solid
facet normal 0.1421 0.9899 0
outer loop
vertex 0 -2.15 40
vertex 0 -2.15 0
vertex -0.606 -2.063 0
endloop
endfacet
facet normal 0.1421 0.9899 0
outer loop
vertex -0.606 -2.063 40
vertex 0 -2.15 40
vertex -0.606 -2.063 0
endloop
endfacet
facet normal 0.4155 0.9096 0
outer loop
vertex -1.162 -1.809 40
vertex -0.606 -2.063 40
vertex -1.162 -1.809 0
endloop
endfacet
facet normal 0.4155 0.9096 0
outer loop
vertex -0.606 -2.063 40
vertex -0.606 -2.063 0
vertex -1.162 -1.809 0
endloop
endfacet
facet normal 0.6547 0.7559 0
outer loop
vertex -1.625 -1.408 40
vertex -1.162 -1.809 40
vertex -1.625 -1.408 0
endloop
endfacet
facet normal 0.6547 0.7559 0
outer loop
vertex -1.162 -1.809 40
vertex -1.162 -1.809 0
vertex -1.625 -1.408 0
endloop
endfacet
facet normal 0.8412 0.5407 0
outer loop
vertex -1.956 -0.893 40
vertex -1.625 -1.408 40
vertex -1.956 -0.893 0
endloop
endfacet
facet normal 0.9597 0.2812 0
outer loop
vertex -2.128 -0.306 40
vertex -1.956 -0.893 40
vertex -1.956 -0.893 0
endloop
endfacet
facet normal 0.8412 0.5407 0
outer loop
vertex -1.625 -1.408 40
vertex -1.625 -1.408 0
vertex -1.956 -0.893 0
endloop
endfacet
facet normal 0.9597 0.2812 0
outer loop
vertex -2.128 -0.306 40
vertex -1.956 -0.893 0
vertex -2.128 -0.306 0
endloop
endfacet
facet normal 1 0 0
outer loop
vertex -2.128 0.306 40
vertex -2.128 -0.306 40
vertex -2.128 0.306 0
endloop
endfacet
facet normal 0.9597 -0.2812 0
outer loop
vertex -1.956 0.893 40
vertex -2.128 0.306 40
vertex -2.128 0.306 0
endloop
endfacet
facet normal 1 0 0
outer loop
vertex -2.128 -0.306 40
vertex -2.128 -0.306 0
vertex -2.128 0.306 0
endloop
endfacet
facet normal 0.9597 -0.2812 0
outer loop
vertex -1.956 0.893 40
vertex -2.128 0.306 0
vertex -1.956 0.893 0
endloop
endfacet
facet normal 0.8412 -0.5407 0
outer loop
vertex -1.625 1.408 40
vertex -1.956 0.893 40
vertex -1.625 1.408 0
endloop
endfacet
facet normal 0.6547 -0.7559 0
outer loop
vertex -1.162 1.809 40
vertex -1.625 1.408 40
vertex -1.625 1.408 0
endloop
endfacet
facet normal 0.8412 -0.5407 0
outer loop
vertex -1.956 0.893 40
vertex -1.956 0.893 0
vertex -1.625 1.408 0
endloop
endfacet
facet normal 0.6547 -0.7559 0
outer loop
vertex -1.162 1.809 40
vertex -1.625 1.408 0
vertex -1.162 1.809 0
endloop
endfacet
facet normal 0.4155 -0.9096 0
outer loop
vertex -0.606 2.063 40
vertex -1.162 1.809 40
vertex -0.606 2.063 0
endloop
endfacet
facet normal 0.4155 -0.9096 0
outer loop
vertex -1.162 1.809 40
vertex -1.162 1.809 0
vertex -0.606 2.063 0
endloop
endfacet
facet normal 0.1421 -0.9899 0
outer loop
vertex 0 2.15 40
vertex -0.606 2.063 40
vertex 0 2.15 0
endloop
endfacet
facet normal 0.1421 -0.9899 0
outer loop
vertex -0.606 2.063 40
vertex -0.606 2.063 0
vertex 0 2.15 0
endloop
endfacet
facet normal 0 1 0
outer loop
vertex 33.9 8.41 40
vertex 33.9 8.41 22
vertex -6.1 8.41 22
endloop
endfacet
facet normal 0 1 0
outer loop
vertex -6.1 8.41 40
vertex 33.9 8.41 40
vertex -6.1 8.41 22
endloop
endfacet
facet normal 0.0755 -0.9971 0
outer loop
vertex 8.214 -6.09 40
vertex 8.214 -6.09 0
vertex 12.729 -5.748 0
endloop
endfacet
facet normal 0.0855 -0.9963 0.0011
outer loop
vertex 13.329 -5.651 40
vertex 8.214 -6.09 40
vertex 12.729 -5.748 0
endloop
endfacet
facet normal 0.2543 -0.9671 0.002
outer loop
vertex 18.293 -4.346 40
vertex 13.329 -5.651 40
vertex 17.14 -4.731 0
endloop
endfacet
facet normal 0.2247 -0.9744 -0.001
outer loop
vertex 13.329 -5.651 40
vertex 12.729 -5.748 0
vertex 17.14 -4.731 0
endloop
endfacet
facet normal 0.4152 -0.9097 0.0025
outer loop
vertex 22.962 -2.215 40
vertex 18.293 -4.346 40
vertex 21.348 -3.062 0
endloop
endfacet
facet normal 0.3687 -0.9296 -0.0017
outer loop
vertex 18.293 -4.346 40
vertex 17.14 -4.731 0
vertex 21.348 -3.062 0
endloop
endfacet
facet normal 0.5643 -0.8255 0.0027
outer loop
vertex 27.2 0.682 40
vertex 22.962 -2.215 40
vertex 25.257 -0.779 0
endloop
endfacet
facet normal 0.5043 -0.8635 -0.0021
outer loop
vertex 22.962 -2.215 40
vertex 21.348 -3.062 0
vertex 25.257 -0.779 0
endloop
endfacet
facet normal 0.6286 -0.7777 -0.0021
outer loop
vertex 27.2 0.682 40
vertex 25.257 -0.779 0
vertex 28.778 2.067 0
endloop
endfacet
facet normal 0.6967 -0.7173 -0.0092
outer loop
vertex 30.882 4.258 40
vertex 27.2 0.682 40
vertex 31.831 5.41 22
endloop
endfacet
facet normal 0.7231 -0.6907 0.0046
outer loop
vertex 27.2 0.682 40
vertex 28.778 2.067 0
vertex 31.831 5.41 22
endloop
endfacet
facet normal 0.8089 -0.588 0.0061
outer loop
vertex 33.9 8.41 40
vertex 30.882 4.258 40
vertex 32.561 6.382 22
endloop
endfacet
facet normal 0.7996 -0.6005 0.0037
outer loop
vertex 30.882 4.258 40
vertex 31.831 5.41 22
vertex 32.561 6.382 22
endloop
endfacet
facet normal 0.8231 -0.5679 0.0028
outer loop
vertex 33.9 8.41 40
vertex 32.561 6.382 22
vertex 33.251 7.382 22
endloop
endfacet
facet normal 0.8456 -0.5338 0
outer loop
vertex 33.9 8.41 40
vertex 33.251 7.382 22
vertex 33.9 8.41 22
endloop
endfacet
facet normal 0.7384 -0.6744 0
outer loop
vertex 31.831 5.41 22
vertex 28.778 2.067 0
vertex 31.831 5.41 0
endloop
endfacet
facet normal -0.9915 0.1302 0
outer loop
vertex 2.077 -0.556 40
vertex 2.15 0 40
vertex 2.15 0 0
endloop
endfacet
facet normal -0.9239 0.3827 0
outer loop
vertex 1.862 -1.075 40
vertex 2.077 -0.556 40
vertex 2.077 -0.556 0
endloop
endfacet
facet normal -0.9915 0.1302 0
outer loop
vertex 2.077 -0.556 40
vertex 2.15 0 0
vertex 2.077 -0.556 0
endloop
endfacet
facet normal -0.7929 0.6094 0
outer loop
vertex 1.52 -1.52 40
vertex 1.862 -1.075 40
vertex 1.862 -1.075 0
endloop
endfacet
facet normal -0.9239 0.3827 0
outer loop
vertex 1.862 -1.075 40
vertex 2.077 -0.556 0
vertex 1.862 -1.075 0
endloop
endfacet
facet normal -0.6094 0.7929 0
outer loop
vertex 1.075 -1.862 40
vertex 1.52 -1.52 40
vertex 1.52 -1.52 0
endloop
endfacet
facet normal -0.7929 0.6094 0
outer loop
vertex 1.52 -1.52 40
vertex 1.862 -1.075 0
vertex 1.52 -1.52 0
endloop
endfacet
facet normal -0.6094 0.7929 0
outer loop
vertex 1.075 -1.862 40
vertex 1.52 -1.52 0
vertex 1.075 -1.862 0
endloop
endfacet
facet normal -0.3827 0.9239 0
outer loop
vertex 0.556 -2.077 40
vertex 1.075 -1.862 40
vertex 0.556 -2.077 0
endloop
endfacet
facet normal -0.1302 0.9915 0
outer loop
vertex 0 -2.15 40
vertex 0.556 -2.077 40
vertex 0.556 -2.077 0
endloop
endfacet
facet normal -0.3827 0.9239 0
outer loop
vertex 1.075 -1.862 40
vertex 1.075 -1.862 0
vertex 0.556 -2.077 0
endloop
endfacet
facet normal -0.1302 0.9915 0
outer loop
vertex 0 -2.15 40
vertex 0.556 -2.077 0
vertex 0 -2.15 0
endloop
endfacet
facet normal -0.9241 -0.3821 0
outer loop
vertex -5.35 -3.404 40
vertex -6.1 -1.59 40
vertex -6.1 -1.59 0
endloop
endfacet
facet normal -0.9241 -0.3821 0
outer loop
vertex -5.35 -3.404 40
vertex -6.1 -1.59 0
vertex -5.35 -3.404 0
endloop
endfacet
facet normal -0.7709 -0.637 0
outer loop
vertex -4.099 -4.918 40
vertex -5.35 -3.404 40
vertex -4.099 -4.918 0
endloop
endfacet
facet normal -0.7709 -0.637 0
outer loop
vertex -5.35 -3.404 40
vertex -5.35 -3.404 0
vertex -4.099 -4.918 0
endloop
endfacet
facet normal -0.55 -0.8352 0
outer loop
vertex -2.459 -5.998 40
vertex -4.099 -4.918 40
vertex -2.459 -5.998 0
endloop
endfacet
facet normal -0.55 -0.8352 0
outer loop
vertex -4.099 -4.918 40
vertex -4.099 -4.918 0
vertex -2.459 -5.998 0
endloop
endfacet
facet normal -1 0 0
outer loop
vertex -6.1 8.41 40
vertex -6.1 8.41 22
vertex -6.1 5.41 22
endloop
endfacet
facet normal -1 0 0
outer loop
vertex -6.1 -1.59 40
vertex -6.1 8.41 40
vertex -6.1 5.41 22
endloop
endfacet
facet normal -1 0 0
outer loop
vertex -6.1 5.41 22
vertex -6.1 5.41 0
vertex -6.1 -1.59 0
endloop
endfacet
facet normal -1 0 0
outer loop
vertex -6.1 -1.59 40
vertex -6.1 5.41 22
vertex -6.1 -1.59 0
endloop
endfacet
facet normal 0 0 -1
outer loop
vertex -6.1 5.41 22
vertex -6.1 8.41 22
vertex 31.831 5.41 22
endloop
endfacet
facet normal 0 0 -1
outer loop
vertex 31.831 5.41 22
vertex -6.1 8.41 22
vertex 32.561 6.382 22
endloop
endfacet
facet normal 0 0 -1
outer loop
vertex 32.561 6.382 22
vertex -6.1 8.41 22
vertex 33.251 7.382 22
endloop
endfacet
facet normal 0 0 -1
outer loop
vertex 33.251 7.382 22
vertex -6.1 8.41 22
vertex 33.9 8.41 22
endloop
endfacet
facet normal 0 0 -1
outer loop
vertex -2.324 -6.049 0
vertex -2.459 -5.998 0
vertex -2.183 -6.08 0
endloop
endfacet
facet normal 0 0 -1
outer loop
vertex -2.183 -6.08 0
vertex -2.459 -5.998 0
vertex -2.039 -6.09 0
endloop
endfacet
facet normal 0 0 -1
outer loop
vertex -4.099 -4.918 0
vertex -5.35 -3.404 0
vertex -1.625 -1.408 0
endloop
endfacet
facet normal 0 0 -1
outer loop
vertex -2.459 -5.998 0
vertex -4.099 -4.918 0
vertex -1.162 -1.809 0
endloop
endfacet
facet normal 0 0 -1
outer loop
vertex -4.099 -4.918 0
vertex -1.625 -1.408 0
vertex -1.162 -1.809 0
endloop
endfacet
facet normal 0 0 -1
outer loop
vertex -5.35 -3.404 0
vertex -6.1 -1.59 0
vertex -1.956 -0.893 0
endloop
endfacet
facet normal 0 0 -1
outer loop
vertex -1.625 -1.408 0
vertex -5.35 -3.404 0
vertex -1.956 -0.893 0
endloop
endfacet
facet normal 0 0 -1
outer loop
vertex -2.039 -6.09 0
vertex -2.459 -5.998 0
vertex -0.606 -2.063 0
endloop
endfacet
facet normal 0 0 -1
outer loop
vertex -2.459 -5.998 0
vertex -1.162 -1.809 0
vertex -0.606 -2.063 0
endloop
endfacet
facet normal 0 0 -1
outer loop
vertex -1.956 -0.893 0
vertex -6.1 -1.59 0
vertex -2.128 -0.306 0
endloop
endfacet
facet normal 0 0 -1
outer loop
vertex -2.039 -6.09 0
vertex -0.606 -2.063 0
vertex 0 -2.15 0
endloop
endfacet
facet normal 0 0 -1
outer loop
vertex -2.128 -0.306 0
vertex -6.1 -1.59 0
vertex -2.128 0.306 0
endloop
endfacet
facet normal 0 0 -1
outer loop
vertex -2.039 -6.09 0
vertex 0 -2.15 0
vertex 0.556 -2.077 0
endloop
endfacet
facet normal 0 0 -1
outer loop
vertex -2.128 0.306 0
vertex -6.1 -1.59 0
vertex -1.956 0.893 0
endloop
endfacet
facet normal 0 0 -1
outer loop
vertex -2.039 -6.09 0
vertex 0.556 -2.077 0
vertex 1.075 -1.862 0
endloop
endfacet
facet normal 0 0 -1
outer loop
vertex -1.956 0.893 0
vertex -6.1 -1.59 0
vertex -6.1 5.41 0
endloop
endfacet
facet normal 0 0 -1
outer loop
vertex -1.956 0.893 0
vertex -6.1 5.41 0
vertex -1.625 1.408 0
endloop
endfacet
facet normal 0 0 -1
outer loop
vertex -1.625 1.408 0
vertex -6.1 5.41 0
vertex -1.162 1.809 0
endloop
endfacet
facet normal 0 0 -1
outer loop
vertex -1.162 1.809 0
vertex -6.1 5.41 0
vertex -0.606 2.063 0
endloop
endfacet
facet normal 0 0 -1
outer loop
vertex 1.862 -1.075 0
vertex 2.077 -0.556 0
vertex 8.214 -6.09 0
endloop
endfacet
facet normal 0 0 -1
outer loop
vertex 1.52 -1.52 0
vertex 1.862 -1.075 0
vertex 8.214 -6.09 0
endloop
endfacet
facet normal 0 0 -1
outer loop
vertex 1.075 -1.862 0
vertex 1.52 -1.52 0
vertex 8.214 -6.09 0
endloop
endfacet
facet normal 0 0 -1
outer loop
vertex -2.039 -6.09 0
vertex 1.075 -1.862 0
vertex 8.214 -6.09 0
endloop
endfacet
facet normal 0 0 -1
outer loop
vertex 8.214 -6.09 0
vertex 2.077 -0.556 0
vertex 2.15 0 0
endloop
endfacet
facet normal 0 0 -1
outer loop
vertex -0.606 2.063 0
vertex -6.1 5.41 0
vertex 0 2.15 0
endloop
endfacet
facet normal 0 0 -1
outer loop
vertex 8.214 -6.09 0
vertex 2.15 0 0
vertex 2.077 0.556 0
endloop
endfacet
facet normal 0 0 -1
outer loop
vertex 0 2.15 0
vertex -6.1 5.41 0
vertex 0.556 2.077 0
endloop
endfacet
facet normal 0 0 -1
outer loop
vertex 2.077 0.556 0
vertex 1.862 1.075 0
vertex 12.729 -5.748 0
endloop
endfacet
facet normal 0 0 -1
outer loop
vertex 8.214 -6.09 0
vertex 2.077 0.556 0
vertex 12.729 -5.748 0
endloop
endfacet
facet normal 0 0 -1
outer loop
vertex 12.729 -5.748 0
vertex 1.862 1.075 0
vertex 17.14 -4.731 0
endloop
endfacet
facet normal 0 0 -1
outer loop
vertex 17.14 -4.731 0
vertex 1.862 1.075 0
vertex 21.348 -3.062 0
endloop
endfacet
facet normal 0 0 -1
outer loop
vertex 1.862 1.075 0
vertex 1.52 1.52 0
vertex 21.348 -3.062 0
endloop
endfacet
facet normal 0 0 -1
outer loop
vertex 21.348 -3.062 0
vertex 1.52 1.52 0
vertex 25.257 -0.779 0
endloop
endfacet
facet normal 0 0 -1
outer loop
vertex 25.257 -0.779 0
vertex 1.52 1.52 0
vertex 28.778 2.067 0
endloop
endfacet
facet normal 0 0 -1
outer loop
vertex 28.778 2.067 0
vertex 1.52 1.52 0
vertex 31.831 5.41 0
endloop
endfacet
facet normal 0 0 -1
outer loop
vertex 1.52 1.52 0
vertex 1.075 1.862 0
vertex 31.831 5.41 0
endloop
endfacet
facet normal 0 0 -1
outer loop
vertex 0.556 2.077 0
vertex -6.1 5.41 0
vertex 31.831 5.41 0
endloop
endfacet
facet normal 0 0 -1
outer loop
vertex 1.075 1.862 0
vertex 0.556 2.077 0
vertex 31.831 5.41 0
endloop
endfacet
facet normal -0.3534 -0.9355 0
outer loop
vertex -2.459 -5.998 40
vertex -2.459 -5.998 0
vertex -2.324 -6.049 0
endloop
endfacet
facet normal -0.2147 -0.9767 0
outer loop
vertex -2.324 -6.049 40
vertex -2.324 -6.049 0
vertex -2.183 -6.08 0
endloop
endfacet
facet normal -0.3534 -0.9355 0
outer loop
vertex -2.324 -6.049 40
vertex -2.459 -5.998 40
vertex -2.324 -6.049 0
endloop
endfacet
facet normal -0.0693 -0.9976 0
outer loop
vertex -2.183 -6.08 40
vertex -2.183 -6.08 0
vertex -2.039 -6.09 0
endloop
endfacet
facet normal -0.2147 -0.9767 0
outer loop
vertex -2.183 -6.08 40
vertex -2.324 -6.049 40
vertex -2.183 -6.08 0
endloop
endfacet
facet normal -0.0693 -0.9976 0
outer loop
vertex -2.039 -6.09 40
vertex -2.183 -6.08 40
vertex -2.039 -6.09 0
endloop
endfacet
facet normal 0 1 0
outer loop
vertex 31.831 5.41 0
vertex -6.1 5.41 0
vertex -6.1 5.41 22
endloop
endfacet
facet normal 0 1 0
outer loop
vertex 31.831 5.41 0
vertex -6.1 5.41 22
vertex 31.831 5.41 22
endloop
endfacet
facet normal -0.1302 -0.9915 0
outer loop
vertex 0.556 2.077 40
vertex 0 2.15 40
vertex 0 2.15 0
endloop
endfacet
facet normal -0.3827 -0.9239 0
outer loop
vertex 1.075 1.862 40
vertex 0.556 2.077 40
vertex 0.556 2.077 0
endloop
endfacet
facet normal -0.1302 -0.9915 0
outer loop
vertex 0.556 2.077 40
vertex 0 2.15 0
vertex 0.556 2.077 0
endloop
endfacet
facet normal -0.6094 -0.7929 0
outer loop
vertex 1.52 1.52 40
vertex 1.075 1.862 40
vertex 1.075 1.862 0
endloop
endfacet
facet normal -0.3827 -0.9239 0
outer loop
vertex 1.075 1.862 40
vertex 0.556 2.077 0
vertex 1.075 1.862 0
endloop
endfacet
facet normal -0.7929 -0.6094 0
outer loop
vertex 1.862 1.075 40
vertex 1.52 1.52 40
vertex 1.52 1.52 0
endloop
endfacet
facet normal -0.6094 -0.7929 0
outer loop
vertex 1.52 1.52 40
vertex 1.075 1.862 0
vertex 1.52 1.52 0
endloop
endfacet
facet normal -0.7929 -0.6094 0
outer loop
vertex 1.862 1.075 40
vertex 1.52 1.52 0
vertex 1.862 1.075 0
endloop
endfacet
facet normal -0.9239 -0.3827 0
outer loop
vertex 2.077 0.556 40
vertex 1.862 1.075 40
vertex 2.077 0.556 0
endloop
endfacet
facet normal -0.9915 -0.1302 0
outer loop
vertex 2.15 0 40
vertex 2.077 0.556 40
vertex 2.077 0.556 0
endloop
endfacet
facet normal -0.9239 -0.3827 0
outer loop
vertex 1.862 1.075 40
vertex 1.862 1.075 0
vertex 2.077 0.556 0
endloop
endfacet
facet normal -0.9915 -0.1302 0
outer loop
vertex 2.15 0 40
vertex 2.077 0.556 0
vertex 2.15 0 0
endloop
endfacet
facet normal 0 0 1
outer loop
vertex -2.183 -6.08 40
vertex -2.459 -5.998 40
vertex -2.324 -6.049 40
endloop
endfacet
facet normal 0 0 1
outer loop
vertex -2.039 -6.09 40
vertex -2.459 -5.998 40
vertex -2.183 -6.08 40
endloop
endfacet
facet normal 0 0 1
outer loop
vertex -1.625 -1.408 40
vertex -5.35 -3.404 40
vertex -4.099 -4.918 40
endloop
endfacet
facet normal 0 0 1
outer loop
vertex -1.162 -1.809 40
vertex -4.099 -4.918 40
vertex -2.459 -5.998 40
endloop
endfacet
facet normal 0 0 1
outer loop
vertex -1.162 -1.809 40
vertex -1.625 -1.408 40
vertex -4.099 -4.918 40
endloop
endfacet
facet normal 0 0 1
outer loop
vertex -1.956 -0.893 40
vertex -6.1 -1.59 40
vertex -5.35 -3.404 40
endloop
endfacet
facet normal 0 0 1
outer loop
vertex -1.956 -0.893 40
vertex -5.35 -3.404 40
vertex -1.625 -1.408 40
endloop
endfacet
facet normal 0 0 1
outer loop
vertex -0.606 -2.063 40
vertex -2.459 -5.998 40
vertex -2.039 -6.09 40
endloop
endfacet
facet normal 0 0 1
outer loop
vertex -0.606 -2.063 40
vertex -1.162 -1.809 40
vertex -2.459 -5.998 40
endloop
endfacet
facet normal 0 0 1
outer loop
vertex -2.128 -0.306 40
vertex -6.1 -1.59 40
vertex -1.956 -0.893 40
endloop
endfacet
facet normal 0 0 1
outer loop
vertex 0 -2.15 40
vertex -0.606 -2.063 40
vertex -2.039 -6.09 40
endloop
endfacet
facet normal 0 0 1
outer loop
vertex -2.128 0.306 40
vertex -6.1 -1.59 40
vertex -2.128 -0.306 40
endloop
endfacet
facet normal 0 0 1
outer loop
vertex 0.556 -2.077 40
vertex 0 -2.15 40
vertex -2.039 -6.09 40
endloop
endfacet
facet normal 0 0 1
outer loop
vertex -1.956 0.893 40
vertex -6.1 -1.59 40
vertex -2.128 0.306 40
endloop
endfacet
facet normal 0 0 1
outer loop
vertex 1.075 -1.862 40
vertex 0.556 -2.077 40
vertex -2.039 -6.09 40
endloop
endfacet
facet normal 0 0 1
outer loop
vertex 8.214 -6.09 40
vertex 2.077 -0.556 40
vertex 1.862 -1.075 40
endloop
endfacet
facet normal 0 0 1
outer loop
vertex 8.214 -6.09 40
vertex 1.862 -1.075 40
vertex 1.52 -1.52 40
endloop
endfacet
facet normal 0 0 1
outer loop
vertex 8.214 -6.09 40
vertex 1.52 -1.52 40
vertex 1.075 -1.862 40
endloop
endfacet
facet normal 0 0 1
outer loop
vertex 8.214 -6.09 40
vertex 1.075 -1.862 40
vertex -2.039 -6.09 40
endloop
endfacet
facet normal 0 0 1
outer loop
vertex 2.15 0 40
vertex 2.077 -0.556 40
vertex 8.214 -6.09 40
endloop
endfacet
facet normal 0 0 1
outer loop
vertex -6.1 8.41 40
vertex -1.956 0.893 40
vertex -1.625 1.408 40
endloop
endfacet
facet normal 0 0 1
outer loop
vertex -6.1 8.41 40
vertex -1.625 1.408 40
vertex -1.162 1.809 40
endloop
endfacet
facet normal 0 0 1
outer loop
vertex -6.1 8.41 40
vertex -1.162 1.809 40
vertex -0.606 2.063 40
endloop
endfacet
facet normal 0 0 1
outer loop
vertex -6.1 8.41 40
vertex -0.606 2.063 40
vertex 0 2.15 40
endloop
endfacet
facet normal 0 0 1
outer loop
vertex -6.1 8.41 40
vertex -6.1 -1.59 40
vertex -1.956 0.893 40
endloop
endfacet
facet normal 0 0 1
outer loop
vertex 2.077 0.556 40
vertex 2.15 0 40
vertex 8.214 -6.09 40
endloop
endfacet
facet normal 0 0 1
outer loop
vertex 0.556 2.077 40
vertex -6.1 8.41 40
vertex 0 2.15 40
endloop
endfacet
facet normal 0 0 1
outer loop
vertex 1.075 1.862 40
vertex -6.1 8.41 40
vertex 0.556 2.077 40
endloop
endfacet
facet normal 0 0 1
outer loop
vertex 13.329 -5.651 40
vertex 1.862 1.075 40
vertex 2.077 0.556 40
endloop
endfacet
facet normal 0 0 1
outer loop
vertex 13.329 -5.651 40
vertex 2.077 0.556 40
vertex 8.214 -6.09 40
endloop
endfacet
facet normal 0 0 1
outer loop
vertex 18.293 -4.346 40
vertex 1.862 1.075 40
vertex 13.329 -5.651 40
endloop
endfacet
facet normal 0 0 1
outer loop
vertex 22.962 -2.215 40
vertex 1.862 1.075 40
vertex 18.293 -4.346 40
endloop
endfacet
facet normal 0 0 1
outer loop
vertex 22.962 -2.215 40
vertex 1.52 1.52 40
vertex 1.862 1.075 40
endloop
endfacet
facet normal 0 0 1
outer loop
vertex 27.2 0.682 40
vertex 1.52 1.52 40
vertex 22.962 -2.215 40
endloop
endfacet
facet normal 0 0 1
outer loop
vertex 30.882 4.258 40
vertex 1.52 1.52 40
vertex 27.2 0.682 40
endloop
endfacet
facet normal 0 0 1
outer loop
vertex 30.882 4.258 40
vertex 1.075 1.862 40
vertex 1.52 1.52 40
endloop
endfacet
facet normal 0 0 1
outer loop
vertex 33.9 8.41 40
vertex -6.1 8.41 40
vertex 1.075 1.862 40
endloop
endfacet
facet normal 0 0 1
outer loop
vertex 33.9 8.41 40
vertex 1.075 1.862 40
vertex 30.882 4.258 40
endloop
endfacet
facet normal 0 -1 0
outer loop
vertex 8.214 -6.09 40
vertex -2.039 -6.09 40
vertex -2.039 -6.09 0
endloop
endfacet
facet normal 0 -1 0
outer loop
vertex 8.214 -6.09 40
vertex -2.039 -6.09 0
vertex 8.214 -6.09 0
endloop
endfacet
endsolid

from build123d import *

# Parameters (mm, degrees)
F0_W        = 6.1
F0_H        = 3
F0_W_2      = 27.8
F1_DEPTH    = 40
F2_R        = 1
F3_T1_DEPTH = 168.4279953904
F4_DEPTH    = 22


# Not quite as in the source:
# - a fillet or chamfer that OpenCascade refuses, or shapes differently, is made with other operations: its cross-section is extruded or revolved along the edge and cut away or added


with BuildPart() as f1:
    # F0 (on Top) → F1 (new body)
    with BuildSketch(Plane.XY):
        with Locations((3.05, 6.91)):
            Rectangle(F0_W, F0_H)
        with Locations((-3.05, 6.91)):
            Rectangle(F0_W, F0_H)
        with BuildLine():
            Line((6.1, -1.59), (6.1, 5.41))
            Line((6.1, 5.41), (0, 5.41))
            Line((0, 5.41), (0, 2.15))
            ThreePointArc((0, 2.15), (1.5202795796, 1.5202795796), (2.15, 0))
            ThreePointArc((2.15, 0), (1.5202795796, -1.5202795796), (0, -2.15))
            Line((0, -2.15), (0, -6.09))
            Line((0, -6.09), (2.25, -6.09))
            ThreePointArc((2.25, -6.09), (4.7073896383, -4.2954889128), (6.1, -1.59))
        make_face()
        with Locations((20, 6.91)):
            Rectangle(F0_W_2, F0_H)
        with BuildLine():
            Line((33.9, 5.41), (6.1, 5.41))
            Line((6.1, 5.41), (6.1, -1.59))
            ThreePointArc((6.1, -1.59), (4.7073896383, -4.2954889128), (2.25, -6.09))
            Line((2.25, -6.09), (33.9, -6.09))
            Line((33.9, -6.09), (33.9, 5.41))
        make_face()
        with BuildLine():
            Line((0, 2.15), (0, 5.41))
            Line((0, 5.41), (-6.1, 5.41))
            Line((-6.1, 5.41), (-6.1, -1.59))
            ThreePointArc((-6.1, -1.59), (-4.7073896383, -4.2954889128), (-2.25, -6.09))
            Line((-2.25, -6.09), (0, -6.09))
            Line((0, -6.09), (0, -2.15))
            ThreePointArc((0, -2.15), (-2.15, 0), (0, 2.15))
        make_face()
    extrude(amount=F1_DEPTH)

    # F2
    f2_edges = [f1.edges().sort_by_distance(p)[0] for p in [
        (-2.25, -6.09, 20),
    ]]
    fillet(f2_edges, radius=F2_R)

    # F3: fillet of radius 30 on 1 edges, made by hand

    # F3_s2 → F3_t1 (cut)
    with BuildSketch(Plane.XY.offset(-64.2139976952)):
        with BuildLine():
            ThreePointArc((8.2144009219, -6.09), (22.9622821257, -2.2147009552), (33.9, 8.41))
            Line((33.9, 8.41), (33.9, -6.09))
            Line((33.9, -6.09), (8.2144009219, -6.09))
        make_face()
    extrude(amount=F3_T1_DEPTH, mode=Mode.SUBTRACT)

    # F0 (on Top) → F4 (cut)
    with BuildSketch(Plane.XY):
        with Locations((-3.05, 6.91)):
            Rectangle(F0_W, F0_H)
        with Locations((3.05, 6.91)):
            Rectangle(F0_W, F0_H)
        with Locations((20, 6.91)):
            Rectangle(F0_W_2, F0_H)
    extrude(amount=F4_DEPTH, mode=Mode.SUBTRACT)


solid = f1.part
